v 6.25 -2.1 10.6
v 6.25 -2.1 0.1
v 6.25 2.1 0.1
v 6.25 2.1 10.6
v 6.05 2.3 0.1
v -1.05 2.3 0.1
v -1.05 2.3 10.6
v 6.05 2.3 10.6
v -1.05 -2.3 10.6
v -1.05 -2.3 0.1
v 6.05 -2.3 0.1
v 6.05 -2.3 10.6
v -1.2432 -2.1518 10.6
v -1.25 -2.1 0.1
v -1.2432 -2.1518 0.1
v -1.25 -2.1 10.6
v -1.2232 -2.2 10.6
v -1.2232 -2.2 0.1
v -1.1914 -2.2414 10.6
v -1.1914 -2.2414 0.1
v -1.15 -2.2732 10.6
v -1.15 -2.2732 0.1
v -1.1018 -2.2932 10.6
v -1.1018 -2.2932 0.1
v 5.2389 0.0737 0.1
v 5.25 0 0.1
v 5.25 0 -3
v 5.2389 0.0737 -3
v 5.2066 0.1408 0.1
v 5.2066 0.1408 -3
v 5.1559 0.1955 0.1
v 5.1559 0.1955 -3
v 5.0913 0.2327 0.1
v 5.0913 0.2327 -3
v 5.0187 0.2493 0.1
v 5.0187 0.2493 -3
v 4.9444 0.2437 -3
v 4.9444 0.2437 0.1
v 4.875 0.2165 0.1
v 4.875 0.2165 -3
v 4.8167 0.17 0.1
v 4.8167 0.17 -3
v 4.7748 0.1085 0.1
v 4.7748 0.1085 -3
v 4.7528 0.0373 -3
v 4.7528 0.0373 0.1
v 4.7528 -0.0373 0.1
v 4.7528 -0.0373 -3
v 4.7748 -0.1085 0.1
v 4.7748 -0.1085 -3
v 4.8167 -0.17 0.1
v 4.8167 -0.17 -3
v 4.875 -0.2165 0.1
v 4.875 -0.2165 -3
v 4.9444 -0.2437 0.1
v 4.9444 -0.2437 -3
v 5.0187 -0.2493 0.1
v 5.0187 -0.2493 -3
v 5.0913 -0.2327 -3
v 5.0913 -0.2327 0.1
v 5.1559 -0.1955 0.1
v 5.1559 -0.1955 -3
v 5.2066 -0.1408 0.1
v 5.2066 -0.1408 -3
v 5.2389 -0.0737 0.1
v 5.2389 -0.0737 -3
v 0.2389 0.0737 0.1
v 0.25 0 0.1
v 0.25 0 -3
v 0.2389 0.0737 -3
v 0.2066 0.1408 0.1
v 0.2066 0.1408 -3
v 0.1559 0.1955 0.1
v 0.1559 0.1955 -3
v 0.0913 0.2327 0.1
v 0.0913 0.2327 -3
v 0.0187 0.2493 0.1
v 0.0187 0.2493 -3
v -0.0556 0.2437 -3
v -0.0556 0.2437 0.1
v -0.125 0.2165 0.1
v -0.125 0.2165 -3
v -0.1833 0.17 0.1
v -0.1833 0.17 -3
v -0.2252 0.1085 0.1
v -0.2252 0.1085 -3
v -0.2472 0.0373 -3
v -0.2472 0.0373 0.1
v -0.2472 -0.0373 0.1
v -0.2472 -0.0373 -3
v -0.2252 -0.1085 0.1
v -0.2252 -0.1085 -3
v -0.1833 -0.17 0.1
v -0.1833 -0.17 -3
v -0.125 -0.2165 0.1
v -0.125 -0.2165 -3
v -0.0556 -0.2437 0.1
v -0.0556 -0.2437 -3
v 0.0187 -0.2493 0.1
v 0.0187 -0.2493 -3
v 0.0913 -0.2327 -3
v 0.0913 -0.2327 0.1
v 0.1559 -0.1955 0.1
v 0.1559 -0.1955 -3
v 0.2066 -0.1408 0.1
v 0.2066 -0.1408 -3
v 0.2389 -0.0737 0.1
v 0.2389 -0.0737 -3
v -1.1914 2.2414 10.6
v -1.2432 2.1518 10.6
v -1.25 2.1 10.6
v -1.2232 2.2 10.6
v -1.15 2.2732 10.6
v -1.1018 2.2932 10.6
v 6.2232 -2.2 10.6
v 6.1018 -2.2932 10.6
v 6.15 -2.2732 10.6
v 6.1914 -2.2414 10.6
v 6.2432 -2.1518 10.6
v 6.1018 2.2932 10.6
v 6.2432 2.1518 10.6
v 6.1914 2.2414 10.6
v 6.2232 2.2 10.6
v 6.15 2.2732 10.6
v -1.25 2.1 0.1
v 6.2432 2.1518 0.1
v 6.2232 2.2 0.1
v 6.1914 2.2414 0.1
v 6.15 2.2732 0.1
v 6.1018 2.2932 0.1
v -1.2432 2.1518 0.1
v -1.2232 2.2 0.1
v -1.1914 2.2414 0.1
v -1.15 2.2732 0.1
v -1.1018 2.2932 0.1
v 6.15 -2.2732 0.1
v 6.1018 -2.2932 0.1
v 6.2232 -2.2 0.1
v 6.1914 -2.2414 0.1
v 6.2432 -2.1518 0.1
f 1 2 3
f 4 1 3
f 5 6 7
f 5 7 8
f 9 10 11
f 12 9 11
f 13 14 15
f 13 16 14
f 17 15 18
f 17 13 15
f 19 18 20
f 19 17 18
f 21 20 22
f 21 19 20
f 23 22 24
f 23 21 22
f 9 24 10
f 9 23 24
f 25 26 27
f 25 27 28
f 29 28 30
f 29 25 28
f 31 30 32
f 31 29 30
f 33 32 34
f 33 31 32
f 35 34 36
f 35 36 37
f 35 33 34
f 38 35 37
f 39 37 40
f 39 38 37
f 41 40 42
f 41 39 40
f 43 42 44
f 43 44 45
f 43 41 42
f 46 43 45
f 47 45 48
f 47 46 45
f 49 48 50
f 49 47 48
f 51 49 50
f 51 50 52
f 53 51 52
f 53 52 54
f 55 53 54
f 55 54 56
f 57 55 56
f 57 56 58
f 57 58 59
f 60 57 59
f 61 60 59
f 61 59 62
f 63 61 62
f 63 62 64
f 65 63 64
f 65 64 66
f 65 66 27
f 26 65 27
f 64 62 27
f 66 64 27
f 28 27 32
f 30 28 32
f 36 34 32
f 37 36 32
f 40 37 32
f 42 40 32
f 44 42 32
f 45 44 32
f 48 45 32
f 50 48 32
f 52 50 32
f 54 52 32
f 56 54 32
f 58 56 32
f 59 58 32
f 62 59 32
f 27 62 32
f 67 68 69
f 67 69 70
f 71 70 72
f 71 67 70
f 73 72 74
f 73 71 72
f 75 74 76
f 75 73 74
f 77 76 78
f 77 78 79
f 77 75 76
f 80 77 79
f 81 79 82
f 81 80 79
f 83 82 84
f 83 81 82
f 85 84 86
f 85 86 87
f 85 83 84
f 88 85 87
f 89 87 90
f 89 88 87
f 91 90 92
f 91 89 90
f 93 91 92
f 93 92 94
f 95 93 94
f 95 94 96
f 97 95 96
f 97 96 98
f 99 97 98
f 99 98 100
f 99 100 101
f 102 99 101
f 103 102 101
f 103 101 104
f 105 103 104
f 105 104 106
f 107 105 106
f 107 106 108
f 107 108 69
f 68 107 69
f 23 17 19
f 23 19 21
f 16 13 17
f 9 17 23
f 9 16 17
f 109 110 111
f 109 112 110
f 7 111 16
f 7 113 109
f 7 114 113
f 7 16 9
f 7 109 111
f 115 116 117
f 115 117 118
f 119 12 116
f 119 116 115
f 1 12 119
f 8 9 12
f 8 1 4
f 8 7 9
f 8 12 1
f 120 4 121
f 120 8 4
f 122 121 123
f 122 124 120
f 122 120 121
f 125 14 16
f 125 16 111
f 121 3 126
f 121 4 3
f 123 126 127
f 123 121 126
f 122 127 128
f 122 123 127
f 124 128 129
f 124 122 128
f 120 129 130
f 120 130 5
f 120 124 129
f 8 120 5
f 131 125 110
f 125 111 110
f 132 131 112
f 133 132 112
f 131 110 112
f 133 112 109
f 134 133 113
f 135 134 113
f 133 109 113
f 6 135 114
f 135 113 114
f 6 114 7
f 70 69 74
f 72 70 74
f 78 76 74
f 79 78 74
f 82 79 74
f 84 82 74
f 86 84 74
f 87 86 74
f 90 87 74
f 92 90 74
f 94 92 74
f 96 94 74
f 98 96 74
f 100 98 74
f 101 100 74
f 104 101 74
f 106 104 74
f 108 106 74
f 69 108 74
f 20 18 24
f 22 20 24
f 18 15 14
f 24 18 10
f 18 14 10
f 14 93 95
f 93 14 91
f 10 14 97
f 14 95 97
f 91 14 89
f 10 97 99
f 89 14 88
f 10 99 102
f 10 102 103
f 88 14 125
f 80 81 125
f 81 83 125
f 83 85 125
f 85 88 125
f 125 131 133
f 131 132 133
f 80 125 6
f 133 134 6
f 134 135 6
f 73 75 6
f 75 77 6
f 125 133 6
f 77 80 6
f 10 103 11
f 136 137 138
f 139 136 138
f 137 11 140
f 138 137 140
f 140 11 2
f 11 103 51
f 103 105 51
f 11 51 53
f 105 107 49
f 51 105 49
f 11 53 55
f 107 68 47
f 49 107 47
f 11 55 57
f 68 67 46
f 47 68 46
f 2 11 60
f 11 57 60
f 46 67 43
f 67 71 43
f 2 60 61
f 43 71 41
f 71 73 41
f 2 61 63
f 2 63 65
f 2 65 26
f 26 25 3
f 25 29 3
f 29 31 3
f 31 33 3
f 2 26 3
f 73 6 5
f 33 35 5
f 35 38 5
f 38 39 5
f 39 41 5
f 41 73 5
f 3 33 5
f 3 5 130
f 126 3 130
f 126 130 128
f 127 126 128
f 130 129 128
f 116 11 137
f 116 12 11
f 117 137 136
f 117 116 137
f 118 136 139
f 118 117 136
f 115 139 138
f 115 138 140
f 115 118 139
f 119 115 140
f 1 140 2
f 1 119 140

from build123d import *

# Parameters (mm, degrees)
SKETCH001_R  = 0.25
PAD001_DEPTH = 3.5
SKETCH_W     = 7.5
SKETCH_H     = 4.6
PAD_DEPTH    = 10.5
FILLET_R     = 0.2


with BuildPart() as pad001:
    # Sketch001 → Pad001 (new body)
    with BuildSketch(Plane.XY.offset(0.5)):
        Circle(SKETCH001_R)
        with Locations((5, 0)):
            Circle(SKETCH001_R)
    extrude(amount=-PAD001_DEPTH)


with BuildPart() as fillet_mp_cp:
    # Sketch → Pad (new body)
    with BuildSketch(Plane.XY.offset(0.1)):
        with Locations((2.5, 0)):
            Rectangle(SKETCH_W, SKETCH_H)
    extrude(amount=PAD_DEPTH)

    # Fillet
    fillet_edges = [fillet_mp_cp.edges().sort_by_distance(p)[0] for p in [
        (6.25, -2.3, 5.35),
        (6.25, 2.3, 5.35),
        (-1.25, -2.3, 5.35),
        (-1.25, 2.3, 5.35),
    ]]
    fillet(fillet_edges, radius=FILLET_R)

    # Fillet_mp_cp: union Pad001
    add(pad001.part)


solid = fillet_mp_cp.part
